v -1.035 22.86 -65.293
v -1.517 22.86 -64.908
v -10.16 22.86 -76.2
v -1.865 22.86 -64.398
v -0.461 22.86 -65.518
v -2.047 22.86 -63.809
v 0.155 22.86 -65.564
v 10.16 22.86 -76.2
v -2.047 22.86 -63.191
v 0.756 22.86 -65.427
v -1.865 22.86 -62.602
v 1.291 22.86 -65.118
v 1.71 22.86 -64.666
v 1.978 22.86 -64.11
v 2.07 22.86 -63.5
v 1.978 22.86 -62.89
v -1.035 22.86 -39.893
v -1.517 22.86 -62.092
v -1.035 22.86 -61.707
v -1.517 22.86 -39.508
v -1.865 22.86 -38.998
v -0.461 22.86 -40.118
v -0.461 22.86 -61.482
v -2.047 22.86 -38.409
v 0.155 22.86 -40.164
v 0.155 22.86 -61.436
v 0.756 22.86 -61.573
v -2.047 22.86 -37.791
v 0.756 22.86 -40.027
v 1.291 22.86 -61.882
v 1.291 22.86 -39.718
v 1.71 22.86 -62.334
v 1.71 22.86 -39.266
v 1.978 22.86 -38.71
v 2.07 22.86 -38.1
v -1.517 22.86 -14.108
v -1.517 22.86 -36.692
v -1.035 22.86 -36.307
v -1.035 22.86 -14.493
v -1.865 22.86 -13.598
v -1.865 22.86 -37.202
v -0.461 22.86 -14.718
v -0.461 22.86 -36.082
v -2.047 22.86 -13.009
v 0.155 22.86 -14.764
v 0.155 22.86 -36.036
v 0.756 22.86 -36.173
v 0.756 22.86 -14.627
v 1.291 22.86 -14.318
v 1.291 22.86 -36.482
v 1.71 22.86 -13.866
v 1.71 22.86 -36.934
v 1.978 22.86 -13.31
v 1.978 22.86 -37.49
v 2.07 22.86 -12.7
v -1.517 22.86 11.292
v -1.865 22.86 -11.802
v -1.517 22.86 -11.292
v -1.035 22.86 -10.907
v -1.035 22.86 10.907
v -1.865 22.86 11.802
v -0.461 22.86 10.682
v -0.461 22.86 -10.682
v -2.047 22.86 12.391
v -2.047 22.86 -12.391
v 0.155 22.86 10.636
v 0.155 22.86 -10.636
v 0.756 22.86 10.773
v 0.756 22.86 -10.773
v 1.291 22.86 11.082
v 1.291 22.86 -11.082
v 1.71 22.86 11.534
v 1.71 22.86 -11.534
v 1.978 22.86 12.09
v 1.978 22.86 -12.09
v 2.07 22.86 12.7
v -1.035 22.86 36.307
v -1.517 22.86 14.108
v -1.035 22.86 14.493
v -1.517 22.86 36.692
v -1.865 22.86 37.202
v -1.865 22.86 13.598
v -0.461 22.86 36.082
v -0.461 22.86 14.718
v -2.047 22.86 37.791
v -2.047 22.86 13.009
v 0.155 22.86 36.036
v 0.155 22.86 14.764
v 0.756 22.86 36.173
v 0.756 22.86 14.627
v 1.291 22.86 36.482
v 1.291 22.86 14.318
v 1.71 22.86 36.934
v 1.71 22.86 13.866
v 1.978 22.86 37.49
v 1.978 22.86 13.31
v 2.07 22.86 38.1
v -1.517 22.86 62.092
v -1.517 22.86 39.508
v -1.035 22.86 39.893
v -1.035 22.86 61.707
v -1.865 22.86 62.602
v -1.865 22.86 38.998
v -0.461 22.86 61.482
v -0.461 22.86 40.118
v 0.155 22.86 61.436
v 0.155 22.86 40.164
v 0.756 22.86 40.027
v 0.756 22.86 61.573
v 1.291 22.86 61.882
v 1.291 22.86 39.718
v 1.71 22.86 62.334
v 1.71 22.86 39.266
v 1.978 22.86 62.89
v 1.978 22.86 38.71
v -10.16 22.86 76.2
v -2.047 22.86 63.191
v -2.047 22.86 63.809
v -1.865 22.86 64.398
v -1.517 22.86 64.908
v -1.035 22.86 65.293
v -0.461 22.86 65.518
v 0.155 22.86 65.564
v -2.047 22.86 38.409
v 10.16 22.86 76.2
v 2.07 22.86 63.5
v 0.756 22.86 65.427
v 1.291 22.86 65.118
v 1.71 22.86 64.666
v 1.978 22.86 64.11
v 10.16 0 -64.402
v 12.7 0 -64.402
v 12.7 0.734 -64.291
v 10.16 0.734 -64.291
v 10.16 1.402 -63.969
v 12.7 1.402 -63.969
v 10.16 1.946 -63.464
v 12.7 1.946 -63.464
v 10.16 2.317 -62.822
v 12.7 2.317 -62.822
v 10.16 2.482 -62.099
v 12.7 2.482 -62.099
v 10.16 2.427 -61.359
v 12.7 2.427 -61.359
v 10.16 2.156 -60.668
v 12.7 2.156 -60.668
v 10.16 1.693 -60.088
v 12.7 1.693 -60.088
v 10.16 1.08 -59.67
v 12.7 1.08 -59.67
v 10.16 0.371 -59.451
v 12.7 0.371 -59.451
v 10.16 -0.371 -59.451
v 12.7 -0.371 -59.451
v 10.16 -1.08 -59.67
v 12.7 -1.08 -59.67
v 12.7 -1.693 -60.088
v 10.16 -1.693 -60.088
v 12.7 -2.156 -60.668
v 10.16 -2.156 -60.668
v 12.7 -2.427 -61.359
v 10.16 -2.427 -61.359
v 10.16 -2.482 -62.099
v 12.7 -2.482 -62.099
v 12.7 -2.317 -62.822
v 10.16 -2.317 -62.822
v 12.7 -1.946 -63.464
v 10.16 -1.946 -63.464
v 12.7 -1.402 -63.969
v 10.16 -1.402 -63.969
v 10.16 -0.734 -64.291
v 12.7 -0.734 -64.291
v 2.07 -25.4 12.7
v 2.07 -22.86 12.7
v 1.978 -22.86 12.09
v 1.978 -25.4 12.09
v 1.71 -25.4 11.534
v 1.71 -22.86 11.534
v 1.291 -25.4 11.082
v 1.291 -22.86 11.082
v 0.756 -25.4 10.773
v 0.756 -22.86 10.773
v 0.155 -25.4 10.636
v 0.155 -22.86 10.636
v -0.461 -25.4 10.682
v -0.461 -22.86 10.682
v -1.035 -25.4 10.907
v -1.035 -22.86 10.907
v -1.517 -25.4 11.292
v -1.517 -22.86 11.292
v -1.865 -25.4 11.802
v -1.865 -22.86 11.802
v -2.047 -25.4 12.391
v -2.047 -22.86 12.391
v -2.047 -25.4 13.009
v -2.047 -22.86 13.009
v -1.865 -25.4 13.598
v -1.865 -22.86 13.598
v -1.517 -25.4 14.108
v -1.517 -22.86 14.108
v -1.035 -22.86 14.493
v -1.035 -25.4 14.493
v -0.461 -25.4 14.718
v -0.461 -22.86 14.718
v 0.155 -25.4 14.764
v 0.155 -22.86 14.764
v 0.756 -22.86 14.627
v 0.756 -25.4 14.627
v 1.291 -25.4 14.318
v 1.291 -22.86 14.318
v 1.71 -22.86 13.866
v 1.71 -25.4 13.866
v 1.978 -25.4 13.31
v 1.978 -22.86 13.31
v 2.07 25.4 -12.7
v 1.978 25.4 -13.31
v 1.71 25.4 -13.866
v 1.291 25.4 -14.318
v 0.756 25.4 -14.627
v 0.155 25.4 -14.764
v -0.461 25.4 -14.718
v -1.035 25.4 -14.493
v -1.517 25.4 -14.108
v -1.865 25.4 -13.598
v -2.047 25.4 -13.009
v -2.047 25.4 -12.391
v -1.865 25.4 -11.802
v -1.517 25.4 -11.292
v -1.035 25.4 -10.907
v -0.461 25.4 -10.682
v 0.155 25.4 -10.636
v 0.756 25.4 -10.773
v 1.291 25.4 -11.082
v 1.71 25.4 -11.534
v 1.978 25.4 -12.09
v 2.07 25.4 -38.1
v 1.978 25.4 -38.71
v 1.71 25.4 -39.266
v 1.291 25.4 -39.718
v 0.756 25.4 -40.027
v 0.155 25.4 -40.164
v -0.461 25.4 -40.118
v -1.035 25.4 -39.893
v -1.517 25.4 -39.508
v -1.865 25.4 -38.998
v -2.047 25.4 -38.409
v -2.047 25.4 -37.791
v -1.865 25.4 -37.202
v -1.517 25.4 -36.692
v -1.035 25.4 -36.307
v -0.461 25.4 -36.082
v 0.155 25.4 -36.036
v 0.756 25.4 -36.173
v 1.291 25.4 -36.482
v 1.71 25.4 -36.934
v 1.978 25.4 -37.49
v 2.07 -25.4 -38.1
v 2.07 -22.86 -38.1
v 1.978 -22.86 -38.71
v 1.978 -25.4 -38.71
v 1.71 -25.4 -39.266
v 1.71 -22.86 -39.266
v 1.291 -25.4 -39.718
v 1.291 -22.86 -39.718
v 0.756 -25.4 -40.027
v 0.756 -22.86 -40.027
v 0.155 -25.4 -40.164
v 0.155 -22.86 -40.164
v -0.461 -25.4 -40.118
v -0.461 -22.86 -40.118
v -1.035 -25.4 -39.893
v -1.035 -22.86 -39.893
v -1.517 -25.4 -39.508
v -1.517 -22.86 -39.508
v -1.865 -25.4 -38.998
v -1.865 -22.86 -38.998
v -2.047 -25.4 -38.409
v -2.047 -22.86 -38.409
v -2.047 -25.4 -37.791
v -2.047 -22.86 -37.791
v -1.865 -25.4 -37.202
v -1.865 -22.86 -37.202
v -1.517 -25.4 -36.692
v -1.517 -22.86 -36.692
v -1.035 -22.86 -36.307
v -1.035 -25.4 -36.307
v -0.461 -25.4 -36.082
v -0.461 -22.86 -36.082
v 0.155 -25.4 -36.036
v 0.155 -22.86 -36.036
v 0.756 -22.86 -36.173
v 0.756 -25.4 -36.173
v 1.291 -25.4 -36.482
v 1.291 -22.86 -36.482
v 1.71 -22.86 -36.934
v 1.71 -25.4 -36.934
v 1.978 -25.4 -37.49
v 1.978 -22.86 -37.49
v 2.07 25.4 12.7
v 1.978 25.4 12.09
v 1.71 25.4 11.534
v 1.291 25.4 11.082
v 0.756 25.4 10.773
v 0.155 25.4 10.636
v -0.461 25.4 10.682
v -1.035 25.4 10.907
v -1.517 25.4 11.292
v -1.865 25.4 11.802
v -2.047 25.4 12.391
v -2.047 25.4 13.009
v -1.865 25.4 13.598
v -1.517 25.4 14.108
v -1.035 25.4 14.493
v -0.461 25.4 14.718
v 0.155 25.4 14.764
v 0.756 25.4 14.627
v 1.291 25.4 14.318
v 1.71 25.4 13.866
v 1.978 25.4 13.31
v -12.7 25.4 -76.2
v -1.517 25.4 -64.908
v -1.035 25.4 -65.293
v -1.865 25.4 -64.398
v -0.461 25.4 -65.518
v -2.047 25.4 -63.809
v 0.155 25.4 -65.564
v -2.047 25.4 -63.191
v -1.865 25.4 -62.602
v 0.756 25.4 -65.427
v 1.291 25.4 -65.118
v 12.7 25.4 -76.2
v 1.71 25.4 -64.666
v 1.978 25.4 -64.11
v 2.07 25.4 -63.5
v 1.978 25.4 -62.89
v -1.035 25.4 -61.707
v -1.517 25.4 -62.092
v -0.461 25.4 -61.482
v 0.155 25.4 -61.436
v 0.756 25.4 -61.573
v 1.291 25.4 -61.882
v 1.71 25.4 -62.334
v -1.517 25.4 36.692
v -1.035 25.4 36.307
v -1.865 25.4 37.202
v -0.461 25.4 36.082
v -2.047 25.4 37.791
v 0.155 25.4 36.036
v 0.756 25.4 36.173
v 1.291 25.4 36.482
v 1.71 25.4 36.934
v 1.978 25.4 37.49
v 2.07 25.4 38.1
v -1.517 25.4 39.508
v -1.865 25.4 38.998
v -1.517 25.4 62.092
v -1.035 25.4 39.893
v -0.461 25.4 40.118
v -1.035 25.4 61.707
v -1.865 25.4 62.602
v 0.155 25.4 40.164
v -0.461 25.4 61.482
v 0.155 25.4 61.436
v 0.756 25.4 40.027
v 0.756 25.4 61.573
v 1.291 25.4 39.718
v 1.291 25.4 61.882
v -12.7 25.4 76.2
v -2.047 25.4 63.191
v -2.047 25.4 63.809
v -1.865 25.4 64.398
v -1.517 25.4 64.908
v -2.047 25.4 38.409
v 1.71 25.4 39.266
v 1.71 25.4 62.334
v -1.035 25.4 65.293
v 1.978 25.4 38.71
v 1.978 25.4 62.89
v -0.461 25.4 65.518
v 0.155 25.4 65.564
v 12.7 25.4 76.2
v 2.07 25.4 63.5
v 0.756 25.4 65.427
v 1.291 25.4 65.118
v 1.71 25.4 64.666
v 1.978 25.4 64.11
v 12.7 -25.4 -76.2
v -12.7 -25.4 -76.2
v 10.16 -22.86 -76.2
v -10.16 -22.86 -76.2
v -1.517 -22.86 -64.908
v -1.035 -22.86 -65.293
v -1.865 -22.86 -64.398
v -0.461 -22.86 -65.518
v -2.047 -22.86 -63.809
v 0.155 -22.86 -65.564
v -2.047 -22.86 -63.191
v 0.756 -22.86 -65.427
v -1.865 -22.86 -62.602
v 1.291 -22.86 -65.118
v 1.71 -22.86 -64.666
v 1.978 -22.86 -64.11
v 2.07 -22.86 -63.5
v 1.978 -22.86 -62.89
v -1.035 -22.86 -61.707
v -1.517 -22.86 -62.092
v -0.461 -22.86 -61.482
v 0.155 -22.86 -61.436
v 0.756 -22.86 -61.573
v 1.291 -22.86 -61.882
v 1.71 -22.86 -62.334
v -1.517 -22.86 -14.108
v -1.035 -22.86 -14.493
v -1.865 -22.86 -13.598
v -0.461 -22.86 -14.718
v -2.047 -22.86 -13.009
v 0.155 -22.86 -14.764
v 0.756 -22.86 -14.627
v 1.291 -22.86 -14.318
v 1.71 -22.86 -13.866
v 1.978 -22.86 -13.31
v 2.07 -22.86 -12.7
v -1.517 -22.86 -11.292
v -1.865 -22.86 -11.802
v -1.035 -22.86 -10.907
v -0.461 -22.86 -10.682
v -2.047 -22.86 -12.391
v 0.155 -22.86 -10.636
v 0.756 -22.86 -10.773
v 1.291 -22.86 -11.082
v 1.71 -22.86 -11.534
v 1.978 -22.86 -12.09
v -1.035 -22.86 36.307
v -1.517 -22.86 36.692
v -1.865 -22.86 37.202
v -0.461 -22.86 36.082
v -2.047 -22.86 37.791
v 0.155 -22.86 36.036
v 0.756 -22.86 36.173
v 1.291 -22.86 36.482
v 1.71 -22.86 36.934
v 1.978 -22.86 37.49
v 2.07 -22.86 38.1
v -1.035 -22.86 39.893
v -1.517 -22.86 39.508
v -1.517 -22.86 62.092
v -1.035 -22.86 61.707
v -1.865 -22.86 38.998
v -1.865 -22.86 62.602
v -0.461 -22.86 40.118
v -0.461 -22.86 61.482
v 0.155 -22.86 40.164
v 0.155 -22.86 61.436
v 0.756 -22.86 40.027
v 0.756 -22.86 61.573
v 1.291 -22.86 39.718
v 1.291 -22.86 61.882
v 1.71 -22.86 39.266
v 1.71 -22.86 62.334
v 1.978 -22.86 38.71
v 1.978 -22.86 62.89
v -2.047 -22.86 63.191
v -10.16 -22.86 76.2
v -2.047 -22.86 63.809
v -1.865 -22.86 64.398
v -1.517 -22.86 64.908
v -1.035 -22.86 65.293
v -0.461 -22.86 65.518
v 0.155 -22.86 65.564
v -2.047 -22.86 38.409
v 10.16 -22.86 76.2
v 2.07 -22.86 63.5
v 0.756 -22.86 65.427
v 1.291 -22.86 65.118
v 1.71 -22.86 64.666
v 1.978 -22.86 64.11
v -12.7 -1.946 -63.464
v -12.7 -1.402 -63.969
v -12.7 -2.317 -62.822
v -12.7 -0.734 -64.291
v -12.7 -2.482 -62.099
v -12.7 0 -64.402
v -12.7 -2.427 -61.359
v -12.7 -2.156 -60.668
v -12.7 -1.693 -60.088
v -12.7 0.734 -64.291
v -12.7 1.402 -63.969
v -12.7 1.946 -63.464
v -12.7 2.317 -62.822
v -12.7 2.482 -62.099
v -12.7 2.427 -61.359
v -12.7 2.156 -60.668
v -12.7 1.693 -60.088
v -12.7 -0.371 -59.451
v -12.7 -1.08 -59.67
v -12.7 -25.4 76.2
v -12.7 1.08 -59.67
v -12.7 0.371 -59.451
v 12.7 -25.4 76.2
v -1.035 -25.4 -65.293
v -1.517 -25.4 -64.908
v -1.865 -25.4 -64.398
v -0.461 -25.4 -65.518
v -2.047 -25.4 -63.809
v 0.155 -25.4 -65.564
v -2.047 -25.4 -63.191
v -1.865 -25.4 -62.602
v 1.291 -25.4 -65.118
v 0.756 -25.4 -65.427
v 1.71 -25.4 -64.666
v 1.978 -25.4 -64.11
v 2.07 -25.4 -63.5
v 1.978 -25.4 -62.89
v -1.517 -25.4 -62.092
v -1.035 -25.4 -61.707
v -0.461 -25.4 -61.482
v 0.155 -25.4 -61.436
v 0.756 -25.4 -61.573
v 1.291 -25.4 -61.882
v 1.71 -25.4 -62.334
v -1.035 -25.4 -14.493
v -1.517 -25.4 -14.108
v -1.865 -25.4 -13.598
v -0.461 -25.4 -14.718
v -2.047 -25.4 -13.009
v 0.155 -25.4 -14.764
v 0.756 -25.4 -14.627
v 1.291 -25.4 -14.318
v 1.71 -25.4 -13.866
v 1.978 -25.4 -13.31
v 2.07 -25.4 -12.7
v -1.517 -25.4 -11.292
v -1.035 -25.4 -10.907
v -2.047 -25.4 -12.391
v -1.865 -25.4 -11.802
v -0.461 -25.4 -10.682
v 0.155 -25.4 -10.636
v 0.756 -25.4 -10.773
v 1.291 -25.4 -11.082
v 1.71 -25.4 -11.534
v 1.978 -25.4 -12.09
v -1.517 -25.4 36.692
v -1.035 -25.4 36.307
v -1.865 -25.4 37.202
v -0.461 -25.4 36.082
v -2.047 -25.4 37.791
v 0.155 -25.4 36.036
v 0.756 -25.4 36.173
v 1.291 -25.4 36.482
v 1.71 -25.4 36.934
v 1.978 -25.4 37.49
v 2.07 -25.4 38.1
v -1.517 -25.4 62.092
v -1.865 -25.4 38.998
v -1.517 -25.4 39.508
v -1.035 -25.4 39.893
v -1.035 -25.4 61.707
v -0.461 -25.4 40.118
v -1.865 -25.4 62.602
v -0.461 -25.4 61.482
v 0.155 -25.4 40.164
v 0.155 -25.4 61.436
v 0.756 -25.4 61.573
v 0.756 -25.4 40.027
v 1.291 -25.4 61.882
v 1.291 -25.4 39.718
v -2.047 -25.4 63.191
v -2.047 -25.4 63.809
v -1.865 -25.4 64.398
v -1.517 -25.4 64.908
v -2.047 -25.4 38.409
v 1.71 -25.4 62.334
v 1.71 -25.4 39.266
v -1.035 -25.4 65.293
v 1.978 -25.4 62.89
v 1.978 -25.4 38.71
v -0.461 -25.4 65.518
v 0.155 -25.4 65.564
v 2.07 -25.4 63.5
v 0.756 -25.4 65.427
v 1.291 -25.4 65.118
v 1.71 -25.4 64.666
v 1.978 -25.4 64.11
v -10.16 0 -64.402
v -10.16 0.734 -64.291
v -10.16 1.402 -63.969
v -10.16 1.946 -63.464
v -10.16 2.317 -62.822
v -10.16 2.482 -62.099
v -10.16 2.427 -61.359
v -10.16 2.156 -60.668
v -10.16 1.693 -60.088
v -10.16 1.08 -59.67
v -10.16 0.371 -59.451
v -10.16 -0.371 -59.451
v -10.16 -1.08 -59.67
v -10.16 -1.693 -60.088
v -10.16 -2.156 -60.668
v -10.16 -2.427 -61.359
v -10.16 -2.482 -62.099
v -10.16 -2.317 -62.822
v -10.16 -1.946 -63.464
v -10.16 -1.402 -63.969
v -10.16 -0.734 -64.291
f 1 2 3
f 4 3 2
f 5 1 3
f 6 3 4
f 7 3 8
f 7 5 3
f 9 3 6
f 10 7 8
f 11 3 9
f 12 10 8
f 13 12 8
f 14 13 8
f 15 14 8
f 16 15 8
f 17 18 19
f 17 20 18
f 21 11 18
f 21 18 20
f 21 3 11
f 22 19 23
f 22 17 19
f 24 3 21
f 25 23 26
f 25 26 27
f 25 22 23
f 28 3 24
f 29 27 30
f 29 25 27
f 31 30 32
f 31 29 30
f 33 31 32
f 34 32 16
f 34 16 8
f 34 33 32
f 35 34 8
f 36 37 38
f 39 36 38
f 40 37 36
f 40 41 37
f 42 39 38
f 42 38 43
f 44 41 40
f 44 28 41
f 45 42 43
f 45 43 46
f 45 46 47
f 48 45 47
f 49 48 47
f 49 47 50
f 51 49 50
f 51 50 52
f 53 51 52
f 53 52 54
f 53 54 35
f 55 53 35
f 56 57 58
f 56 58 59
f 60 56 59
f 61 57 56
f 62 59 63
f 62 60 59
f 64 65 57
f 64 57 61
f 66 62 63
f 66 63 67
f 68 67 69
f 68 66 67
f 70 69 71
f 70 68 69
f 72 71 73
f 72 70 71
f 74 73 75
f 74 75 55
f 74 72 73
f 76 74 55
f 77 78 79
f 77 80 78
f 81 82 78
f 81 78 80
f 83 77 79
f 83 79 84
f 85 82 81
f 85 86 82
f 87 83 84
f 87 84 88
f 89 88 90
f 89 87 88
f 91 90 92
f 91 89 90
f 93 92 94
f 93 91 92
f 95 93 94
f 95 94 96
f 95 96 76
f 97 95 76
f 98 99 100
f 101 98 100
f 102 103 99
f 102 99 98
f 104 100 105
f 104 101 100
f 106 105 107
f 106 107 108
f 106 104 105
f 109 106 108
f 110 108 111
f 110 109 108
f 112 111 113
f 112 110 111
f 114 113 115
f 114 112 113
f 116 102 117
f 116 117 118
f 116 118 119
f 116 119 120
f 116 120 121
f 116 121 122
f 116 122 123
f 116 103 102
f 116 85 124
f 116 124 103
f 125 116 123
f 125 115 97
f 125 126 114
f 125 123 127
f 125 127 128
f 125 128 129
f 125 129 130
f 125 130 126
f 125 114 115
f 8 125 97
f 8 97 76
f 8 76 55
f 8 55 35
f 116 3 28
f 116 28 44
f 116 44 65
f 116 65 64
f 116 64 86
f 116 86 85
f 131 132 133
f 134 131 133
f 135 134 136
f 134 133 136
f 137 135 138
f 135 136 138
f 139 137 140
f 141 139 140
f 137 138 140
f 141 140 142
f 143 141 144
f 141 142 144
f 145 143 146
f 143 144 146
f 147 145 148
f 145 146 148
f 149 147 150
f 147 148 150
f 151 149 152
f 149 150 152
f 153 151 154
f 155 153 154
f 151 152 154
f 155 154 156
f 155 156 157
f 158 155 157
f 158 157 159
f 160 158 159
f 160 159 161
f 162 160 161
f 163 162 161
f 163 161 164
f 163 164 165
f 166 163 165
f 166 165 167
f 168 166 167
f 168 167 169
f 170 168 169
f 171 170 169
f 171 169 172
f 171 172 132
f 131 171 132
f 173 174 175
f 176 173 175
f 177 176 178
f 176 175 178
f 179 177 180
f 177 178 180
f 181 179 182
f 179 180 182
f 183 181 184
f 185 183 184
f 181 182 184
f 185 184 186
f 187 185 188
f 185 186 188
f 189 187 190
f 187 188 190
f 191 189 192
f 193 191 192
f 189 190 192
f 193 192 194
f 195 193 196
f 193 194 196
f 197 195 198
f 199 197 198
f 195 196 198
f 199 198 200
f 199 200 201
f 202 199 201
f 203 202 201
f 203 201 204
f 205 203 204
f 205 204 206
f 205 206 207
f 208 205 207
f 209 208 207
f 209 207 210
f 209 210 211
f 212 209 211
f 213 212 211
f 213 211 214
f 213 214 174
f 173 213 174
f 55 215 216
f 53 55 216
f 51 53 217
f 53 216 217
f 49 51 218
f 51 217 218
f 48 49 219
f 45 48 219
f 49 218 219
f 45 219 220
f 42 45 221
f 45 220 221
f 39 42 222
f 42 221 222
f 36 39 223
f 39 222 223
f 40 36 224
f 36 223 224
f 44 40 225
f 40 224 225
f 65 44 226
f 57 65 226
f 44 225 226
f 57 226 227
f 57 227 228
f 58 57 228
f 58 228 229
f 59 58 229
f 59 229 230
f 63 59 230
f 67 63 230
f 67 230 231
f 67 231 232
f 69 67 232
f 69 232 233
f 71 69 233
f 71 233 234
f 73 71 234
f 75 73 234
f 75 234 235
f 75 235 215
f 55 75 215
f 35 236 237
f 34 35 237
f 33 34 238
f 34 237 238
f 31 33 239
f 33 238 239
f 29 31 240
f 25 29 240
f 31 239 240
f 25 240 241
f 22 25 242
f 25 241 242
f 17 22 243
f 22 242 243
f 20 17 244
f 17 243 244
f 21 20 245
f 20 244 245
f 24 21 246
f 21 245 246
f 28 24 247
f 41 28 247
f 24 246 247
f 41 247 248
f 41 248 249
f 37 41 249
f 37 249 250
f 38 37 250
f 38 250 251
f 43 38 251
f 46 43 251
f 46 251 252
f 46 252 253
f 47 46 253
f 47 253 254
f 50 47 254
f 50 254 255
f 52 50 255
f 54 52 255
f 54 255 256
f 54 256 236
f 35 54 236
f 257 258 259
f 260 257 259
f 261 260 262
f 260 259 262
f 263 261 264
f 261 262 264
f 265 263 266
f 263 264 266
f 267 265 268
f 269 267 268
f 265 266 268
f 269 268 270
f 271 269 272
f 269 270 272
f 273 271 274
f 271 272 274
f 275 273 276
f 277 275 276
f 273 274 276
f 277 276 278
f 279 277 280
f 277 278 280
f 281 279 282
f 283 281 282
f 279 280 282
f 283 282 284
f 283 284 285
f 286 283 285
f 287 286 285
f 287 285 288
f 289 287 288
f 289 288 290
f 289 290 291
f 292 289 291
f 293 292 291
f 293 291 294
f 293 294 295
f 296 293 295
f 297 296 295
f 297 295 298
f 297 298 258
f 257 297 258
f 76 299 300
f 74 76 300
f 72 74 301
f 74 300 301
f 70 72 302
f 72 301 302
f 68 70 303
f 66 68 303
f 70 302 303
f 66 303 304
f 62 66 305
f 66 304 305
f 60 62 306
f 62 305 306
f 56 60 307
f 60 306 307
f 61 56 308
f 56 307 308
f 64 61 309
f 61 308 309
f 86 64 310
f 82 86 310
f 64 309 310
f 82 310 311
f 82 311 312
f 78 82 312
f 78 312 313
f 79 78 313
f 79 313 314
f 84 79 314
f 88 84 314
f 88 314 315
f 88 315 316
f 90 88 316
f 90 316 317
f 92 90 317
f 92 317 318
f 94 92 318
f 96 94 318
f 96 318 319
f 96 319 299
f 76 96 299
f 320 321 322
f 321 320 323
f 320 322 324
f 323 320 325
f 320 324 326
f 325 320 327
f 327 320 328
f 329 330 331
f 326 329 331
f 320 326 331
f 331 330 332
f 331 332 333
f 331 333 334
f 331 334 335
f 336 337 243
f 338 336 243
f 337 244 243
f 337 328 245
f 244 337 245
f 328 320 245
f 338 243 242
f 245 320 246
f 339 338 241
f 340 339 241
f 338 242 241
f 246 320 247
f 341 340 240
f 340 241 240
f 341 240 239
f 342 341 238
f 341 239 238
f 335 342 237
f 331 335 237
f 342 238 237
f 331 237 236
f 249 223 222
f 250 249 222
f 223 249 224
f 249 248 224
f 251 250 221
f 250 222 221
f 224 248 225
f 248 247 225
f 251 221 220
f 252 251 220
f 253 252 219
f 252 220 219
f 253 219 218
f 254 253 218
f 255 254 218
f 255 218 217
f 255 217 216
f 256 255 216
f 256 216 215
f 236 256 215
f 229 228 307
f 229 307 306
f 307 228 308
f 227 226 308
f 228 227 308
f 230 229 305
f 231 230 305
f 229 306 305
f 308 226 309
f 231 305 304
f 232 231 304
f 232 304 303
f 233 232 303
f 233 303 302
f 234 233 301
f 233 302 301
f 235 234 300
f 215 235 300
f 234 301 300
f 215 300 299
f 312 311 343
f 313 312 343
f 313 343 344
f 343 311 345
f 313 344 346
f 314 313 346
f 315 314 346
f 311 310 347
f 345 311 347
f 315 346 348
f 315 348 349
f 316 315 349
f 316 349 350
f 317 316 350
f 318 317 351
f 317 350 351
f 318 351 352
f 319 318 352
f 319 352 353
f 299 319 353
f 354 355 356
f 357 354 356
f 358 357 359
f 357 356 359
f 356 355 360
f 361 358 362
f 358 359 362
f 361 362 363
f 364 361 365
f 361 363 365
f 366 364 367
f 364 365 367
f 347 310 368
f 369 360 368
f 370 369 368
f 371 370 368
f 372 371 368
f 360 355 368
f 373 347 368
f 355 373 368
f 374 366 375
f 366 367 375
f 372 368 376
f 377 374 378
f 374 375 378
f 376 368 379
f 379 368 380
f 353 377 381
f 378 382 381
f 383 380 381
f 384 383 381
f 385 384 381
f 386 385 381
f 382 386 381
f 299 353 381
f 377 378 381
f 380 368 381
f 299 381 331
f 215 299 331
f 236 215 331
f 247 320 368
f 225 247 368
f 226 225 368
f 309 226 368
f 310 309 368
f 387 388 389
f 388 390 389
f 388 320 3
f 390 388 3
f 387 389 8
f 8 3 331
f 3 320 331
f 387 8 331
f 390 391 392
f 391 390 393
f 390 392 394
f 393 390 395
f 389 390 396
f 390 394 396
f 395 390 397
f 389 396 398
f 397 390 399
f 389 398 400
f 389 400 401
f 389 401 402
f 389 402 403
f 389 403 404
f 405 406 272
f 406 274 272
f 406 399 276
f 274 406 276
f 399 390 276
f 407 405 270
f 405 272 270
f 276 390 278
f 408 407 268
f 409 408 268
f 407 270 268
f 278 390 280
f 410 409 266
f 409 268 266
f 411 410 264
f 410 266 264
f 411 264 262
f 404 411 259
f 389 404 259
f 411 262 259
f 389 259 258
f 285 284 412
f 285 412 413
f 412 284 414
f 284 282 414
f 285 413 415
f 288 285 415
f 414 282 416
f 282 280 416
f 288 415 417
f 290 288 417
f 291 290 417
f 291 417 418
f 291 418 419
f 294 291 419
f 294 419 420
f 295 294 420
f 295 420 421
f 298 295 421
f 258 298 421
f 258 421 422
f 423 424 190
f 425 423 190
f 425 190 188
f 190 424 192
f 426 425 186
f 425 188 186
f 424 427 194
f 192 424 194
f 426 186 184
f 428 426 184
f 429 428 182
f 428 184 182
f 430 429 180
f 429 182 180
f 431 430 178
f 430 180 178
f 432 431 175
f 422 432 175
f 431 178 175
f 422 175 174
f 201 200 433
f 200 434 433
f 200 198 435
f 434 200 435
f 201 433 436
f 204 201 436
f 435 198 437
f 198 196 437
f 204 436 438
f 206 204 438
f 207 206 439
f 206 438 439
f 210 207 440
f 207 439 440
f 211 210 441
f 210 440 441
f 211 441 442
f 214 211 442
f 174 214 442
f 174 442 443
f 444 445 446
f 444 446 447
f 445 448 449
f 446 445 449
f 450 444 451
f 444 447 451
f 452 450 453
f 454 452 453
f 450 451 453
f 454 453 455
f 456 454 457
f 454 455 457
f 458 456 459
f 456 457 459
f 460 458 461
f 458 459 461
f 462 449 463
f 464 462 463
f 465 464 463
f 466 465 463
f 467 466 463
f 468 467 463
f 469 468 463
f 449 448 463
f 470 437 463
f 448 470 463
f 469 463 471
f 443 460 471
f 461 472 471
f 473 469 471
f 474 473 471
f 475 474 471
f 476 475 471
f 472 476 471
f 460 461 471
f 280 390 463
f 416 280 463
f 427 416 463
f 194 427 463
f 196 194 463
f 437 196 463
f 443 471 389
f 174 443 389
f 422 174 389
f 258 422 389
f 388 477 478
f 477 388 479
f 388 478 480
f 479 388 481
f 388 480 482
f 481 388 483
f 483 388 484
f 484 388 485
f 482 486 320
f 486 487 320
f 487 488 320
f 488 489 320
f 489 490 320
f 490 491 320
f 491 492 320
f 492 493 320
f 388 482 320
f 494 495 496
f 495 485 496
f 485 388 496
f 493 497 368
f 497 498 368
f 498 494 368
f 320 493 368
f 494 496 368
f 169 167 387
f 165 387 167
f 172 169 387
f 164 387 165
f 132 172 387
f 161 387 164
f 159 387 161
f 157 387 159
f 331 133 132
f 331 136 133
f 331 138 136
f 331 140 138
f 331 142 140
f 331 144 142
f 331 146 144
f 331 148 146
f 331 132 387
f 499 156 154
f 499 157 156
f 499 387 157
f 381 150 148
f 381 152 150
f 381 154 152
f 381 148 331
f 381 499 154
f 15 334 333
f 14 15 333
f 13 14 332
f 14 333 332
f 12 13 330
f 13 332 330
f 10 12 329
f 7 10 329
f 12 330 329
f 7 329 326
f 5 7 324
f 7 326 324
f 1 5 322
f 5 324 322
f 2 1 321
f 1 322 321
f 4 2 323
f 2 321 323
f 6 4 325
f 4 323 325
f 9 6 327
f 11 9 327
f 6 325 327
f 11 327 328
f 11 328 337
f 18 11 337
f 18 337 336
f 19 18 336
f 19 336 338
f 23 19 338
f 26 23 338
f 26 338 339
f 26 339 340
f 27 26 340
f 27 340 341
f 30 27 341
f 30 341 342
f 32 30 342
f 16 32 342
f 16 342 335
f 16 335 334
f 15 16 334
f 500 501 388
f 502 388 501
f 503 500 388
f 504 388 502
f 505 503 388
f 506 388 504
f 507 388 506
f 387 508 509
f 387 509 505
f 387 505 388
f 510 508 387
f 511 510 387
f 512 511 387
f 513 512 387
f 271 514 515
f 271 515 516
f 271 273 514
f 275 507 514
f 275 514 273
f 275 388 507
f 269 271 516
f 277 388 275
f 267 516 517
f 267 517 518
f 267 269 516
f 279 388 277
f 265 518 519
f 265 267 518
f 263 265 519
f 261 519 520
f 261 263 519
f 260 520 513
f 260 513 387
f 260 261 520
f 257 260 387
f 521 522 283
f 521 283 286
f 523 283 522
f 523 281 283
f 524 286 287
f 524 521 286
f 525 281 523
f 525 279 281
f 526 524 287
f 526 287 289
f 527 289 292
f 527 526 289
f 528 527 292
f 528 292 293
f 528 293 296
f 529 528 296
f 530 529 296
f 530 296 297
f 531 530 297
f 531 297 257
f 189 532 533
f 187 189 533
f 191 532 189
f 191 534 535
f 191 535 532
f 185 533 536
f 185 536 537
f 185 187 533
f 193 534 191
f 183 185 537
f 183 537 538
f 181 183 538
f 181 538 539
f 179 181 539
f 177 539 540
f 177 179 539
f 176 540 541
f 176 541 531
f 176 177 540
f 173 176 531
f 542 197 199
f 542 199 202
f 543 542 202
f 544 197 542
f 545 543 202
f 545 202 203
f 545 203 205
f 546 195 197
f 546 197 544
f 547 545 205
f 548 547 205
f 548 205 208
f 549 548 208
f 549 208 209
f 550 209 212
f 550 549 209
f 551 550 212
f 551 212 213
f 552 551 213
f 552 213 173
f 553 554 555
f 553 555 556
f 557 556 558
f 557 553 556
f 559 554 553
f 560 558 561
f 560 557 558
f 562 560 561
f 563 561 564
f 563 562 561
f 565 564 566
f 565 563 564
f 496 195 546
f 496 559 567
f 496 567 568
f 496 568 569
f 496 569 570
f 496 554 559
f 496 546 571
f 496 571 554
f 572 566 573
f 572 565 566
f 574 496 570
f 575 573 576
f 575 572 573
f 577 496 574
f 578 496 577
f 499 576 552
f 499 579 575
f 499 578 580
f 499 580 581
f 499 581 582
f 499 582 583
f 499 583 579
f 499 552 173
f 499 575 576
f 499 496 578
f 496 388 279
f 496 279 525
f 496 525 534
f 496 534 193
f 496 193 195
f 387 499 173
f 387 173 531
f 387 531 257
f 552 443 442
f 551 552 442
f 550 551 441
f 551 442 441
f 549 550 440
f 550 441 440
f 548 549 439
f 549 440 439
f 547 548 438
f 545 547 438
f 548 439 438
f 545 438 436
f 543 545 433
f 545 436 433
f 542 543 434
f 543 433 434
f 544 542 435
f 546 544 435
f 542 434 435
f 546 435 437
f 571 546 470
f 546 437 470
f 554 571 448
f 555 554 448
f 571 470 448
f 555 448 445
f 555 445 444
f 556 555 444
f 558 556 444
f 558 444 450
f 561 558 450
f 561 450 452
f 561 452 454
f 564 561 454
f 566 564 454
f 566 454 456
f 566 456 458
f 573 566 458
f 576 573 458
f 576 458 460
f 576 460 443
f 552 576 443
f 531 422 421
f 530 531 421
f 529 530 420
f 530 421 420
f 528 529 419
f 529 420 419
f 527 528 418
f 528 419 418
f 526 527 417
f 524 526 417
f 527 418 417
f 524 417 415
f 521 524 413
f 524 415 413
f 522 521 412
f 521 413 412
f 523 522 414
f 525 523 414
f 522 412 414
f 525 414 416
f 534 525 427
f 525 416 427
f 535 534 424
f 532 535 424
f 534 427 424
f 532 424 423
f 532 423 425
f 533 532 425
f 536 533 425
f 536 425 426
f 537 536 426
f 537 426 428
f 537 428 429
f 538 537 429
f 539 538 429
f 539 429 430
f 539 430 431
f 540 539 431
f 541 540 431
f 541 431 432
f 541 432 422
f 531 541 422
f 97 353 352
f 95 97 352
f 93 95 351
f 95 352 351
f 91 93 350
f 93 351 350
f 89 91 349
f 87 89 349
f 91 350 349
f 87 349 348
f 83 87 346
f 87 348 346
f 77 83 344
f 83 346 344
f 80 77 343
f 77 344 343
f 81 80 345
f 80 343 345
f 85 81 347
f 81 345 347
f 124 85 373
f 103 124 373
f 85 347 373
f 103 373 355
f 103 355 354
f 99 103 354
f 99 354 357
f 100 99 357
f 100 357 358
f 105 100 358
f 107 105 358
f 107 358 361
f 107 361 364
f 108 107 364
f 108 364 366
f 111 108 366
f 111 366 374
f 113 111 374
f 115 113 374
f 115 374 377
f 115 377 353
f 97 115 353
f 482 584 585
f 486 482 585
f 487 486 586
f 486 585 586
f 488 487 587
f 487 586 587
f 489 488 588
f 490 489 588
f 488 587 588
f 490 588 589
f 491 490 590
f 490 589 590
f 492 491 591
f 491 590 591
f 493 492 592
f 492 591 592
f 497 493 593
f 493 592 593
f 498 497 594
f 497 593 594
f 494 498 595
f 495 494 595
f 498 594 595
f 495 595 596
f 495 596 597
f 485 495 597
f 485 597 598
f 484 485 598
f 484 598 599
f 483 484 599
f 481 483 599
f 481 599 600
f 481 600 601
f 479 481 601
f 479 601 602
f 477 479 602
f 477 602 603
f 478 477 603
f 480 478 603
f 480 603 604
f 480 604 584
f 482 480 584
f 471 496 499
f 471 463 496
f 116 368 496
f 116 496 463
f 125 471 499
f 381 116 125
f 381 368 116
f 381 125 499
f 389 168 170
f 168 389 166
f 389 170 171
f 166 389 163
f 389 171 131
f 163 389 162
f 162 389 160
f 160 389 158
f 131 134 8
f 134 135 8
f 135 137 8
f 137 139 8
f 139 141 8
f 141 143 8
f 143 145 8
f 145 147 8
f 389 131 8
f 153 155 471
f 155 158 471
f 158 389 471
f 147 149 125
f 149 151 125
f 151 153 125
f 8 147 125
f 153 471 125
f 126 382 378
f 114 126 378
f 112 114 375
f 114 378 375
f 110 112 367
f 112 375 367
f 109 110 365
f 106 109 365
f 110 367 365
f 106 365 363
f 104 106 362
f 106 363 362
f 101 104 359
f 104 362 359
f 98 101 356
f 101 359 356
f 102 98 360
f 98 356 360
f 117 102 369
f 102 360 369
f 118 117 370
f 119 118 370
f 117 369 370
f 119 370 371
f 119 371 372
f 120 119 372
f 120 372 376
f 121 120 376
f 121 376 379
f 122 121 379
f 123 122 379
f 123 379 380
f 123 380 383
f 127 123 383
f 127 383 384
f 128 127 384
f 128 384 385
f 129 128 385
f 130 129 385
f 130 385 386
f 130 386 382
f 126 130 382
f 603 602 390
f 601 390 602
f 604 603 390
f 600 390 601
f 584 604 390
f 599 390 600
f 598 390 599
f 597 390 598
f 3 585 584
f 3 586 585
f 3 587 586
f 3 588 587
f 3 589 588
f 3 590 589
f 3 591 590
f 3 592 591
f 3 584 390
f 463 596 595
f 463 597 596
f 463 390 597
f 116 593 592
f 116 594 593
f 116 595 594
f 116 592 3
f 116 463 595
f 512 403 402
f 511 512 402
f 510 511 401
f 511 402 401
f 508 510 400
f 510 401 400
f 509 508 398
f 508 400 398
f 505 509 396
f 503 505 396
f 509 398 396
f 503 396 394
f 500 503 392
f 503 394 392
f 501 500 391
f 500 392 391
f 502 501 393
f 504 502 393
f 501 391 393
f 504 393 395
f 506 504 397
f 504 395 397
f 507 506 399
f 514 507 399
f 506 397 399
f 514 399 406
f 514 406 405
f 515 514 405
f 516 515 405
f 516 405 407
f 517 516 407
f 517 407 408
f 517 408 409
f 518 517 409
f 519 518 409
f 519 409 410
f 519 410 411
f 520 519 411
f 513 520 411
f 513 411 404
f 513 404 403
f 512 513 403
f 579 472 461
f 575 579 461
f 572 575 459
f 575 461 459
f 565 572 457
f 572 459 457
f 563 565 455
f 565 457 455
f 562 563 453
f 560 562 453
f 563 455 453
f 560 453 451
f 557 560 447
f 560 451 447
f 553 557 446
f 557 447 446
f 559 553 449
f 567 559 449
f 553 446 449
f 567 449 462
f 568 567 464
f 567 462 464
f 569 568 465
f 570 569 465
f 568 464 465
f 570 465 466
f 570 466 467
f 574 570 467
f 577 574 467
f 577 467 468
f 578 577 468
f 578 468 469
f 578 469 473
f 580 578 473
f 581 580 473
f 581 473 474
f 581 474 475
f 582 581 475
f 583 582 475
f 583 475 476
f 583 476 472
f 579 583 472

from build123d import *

# Parameters (mm, degrees)
SKETCH1_W           = 25.4
SKETCH1_H           = 50.8
SKETCH1_W_2         = 20.32
SKETCH1_H_2         = 45.72
EXTRUDE_THIN1_DEPTH = 76.2
SKETCH2_R           = 2.0701
CUT_EXTRUDE1_DEPTH  = 51.8
LPATTERN1_COUNT     = 7
LPATTERN1_PITCH     = 25.4
SKETCH3_R           = 2.4892
CUT_EXTRUDE2_DEPTH  = 26.4


with BuildPart() as part:
    # Sketch1 → Extrude-Thin1 (new body, symmetric)
    with BuildSketch(Plane.XY):
        Rectangle(SKETCH1_W, SKETCH1_H)
        Rectangle(SKETCH1_W_2, SKETCH1_H_2, mode=Mode.SUBTRACT)
    extrude(amount=EXTRUDE_THIN1_DEPTH, both=True)

    # Sketch2 → Cut-Extrude1 (cut, through all)
    with BuildSketch(Plane(origin=(0, 25.4, 0), x_dir=(1, 0, 0), z_dir=(0, 1, 0))):
        with Locations((0, -63.5)):
            Circle(SKETCH2_R)
    cut_extrude1 = extrude(amount=-CUT_EXTRUDE1_DEPTH, mode=Mode.SUBTRACT)

    # LPattern1: Cut-Extrude1 ×7
    with Locations(*[(0, 0, -i * LPATTERN1_PITCH) for i in range(1, LPATTERN1_COUNT)]):
        add(cut_extrude1, mode=Mode.SUBTRACT)

    # Sketch3 → Cut-Extrude2 (cut, through all)
    with BuildSketch(Plane(origin=(12.7, 0, 0), x_dir=(0, 0, -1), z_dir=(1, 0, 0))):
        with Locations((61.9125, 0)):
            Circle(SKETCH3_R)
    extrude(amount=-CUT_EXTRUDE2_DEPTH, mode=Mode.SUBTRACT)


solid = part.part
